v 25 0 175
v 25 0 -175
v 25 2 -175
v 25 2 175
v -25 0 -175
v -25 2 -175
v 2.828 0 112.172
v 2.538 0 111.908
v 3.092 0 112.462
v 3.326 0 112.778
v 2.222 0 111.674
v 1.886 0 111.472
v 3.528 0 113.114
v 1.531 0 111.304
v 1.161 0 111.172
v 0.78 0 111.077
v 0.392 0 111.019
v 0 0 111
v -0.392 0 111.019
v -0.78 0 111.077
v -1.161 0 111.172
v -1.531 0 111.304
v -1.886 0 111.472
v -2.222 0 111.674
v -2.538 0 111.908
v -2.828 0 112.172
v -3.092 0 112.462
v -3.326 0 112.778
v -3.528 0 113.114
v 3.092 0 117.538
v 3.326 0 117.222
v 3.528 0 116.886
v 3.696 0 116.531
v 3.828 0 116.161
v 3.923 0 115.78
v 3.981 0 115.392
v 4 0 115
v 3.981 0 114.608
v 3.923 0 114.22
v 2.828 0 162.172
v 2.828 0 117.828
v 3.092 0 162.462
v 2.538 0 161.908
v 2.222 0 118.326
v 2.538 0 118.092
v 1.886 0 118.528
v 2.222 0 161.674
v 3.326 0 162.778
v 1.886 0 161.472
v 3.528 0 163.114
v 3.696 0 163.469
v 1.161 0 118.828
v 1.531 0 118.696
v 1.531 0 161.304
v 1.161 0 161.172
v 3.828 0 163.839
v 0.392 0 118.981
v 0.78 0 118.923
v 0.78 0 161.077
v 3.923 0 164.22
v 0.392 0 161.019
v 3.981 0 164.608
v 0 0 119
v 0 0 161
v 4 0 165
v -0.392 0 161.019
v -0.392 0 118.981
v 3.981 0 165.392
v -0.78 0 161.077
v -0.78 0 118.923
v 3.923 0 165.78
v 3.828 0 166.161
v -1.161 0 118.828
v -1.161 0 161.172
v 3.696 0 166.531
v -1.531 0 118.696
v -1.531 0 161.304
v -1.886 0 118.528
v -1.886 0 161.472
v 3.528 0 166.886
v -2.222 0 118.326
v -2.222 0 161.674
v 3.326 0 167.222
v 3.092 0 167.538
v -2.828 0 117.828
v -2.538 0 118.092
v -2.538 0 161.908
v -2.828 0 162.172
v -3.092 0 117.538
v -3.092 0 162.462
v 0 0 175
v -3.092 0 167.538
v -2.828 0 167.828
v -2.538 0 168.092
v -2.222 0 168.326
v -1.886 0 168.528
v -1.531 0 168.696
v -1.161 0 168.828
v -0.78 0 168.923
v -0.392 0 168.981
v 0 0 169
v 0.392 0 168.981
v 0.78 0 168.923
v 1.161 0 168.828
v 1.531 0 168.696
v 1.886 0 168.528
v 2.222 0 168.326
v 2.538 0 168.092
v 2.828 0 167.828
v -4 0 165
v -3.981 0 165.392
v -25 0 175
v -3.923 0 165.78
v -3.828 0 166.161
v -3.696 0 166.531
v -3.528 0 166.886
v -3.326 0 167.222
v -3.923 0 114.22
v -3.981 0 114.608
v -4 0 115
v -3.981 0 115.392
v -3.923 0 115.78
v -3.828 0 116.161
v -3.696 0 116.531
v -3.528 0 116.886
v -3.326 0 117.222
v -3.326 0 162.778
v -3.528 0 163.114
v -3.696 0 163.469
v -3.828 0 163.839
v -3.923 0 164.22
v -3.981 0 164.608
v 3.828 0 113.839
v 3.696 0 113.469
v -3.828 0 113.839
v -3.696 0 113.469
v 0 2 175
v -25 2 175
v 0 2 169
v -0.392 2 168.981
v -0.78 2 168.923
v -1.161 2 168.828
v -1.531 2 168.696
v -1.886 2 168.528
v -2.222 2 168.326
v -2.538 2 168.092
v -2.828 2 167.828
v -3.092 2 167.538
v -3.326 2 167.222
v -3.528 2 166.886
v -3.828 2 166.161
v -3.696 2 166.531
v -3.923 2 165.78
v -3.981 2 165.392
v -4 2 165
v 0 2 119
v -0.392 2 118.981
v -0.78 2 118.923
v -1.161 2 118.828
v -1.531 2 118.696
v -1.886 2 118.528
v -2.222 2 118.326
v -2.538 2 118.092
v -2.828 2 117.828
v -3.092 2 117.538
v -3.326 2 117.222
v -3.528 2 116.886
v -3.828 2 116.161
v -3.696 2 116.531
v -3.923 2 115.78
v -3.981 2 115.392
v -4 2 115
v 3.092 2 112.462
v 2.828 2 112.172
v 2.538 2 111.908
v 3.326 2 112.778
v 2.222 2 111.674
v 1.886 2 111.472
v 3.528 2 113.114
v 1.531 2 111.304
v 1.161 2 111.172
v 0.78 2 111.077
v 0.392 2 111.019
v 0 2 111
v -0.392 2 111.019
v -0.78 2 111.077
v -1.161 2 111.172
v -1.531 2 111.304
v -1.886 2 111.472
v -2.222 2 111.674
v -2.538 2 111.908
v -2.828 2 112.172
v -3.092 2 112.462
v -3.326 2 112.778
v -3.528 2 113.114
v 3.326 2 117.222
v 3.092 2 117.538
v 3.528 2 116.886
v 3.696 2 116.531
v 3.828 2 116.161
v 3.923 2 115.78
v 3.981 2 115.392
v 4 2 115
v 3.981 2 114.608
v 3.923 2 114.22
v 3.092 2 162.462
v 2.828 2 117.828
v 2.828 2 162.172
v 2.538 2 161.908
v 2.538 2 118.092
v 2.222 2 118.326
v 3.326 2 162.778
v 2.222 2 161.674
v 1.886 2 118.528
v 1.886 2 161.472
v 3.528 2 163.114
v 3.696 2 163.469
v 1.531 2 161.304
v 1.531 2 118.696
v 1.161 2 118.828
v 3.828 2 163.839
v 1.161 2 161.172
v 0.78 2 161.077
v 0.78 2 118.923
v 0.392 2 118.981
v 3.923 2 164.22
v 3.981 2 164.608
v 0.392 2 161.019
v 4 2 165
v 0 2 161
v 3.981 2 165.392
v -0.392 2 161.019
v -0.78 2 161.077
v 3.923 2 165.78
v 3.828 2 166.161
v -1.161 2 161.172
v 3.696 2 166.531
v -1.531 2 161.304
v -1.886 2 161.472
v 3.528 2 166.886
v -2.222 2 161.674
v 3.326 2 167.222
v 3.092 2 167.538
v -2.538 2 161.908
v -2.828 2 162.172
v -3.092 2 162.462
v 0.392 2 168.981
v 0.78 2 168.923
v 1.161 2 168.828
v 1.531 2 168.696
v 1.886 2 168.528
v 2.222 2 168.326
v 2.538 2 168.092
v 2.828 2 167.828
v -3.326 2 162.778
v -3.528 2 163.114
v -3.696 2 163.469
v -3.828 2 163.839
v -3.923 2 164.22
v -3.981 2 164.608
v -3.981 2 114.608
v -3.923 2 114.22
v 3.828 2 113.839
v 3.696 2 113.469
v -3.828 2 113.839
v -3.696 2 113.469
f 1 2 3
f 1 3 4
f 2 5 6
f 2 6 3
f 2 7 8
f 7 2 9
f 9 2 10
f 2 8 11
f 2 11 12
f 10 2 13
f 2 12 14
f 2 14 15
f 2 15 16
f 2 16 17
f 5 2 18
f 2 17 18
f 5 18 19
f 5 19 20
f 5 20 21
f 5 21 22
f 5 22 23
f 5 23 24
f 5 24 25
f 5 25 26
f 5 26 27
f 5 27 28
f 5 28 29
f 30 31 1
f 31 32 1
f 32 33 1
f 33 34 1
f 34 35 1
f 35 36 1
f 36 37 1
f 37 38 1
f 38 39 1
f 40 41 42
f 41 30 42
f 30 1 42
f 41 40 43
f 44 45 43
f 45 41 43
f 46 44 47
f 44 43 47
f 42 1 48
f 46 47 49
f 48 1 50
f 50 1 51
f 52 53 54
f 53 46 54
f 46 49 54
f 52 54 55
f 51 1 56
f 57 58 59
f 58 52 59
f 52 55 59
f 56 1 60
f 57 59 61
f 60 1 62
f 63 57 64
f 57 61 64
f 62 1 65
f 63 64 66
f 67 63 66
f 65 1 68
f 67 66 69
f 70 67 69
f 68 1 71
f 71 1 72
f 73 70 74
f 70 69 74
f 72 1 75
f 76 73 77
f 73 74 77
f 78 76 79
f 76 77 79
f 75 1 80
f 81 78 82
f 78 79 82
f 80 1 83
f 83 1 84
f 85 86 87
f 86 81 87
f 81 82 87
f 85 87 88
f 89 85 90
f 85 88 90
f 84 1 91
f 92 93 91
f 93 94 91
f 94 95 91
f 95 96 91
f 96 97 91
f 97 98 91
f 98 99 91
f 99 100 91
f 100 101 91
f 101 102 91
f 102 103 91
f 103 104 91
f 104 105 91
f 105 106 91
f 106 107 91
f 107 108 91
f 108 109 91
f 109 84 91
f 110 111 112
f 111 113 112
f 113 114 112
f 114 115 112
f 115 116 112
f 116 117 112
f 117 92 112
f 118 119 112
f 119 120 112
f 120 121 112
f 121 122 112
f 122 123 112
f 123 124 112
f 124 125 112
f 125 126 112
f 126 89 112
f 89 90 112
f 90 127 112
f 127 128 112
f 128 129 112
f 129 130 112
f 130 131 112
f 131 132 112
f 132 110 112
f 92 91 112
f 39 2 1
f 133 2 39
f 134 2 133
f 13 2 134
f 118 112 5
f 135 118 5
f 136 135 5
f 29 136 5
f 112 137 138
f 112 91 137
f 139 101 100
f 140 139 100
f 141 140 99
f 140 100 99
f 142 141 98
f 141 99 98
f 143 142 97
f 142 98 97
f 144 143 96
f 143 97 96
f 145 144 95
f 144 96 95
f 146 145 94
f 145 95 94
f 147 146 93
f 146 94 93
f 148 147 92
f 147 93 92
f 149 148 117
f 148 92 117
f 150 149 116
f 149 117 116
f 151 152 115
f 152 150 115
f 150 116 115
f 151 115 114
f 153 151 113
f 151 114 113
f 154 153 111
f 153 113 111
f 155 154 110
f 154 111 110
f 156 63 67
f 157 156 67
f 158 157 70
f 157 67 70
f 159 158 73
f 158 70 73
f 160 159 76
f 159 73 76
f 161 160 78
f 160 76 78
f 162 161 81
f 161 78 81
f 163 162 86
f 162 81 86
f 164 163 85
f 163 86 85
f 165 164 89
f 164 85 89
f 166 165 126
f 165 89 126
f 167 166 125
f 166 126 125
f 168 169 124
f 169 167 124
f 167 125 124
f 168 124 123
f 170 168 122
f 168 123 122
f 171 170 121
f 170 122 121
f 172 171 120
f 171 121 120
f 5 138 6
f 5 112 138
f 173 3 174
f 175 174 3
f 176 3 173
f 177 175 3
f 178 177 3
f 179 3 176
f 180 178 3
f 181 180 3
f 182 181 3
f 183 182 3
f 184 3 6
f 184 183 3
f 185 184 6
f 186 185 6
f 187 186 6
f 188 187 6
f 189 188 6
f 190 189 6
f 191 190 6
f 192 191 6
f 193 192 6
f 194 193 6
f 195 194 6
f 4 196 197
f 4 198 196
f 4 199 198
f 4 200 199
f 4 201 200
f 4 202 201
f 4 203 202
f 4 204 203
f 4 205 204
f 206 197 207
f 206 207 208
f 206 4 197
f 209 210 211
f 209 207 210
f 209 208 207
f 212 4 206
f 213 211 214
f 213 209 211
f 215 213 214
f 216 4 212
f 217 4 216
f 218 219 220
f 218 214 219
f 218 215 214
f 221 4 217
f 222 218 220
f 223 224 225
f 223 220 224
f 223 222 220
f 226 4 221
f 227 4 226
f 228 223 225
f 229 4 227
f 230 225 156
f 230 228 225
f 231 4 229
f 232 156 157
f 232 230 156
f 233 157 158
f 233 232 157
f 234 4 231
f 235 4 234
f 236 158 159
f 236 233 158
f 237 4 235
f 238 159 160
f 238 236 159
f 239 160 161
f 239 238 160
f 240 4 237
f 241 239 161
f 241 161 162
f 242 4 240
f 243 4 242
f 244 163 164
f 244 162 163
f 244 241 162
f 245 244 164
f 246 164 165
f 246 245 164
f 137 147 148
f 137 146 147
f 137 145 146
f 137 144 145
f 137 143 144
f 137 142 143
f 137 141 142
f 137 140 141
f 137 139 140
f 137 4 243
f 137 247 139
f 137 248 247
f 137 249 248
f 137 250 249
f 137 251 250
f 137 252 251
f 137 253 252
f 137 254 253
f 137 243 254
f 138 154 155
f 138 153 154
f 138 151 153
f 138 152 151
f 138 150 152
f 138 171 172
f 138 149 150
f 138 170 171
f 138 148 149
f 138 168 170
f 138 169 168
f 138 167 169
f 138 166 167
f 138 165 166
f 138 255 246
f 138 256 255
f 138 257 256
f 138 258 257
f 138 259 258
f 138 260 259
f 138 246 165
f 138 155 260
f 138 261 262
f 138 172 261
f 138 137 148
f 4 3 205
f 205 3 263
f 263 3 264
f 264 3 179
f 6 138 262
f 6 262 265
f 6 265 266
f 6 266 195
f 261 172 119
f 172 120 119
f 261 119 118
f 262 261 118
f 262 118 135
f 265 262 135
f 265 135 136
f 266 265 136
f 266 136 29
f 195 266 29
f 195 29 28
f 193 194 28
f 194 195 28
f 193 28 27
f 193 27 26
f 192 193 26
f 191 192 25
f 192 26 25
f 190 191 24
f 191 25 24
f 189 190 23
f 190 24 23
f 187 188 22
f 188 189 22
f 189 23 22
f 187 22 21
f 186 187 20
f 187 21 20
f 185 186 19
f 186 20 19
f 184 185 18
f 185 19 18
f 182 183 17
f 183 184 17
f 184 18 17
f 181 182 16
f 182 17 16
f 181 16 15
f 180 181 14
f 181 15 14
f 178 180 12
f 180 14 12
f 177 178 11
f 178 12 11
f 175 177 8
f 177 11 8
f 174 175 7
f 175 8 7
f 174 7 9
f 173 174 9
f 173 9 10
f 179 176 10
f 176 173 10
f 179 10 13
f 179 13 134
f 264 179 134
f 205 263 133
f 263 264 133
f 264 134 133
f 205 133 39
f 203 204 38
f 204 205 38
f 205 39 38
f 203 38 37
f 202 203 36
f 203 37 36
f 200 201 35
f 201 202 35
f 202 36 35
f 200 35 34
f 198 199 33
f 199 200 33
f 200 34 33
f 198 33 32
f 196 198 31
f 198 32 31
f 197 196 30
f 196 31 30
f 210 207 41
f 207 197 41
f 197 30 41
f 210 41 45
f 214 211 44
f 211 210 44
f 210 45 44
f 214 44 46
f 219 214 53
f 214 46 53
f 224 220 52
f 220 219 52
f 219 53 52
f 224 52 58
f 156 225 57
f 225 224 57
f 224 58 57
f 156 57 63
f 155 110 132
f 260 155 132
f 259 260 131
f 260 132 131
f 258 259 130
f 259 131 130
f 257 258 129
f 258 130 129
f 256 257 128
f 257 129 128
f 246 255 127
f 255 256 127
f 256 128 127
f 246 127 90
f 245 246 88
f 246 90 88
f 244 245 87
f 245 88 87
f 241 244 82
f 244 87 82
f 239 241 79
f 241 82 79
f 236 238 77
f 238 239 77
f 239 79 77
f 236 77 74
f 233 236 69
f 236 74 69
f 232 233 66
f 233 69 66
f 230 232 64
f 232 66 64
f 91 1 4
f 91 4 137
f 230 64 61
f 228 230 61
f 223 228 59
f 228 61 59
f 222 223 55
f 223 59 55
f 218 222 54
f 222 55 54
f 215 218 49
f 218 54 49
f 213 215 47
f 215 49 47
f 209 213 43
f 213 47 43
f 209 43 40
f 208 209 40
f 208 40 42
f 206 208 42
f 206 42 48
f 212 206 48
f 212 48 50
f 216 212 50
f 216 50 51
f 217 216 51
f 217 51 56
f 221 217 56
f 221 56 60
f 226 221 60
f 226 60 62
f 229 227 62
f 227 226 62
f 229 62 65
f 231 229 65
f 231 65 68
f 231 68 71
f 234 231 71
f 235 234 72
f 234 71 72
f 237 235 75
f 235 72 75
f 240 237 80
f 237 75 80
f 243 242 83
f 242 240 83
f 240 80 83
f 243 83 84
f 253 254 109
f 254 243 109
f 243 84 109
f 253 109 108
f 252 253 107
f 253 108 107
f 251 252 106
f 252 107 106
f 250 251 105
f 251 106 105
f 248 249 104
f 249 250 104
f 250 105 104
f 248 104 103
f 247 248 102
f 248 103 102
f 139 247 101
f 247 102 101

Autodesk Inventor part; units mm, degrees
ref_plane "YZ Plane" through (0, 0, 0) normal (1, 0, 0) x (0, 1, 0)
ref_plane "XZ Plane" through (0, 0, 0) normal (0, 1, 0) x (-1, 0, 0)
ref_plane "XY Plane" through (0, 0, 0) normal (0, 0, 1) x (1, 0, 0)
sketch "Sketch1" plane through (0, 0, 0) normal (0, 1, 0) x (-1, 0, 0)
  line L0 (-25, 175) -> (25, 175)
  line L1 (25, 175) -> (25, -175)
  line L2 (25, -175) -> (-25, -175)
  line L3 (-25, -175) -> (-25, 175)
  line L4 (-25, 175) -> (25, -175) construction
  line L5 (25, 175) -> (-25, -175) construction
  line L6 (0, 175) -> (0, 165)
  circle A0 centre (0, 165) radius 4
  line L7 (0, 165) -> (0, 115)
  circle A1 centre (0, 115) radius 4
  point P0 (0, 0)
  dimension "d0" = 50
  dimension "d1" = 350
  dimension "d2" = 10
  dimension "d3" = 8
  dimension "d4" = 50
  dimension "d5" = 8
extrude "Extrusion1" add sketch "Sketch1" along normal blind 2
properties part number "Ldw"
